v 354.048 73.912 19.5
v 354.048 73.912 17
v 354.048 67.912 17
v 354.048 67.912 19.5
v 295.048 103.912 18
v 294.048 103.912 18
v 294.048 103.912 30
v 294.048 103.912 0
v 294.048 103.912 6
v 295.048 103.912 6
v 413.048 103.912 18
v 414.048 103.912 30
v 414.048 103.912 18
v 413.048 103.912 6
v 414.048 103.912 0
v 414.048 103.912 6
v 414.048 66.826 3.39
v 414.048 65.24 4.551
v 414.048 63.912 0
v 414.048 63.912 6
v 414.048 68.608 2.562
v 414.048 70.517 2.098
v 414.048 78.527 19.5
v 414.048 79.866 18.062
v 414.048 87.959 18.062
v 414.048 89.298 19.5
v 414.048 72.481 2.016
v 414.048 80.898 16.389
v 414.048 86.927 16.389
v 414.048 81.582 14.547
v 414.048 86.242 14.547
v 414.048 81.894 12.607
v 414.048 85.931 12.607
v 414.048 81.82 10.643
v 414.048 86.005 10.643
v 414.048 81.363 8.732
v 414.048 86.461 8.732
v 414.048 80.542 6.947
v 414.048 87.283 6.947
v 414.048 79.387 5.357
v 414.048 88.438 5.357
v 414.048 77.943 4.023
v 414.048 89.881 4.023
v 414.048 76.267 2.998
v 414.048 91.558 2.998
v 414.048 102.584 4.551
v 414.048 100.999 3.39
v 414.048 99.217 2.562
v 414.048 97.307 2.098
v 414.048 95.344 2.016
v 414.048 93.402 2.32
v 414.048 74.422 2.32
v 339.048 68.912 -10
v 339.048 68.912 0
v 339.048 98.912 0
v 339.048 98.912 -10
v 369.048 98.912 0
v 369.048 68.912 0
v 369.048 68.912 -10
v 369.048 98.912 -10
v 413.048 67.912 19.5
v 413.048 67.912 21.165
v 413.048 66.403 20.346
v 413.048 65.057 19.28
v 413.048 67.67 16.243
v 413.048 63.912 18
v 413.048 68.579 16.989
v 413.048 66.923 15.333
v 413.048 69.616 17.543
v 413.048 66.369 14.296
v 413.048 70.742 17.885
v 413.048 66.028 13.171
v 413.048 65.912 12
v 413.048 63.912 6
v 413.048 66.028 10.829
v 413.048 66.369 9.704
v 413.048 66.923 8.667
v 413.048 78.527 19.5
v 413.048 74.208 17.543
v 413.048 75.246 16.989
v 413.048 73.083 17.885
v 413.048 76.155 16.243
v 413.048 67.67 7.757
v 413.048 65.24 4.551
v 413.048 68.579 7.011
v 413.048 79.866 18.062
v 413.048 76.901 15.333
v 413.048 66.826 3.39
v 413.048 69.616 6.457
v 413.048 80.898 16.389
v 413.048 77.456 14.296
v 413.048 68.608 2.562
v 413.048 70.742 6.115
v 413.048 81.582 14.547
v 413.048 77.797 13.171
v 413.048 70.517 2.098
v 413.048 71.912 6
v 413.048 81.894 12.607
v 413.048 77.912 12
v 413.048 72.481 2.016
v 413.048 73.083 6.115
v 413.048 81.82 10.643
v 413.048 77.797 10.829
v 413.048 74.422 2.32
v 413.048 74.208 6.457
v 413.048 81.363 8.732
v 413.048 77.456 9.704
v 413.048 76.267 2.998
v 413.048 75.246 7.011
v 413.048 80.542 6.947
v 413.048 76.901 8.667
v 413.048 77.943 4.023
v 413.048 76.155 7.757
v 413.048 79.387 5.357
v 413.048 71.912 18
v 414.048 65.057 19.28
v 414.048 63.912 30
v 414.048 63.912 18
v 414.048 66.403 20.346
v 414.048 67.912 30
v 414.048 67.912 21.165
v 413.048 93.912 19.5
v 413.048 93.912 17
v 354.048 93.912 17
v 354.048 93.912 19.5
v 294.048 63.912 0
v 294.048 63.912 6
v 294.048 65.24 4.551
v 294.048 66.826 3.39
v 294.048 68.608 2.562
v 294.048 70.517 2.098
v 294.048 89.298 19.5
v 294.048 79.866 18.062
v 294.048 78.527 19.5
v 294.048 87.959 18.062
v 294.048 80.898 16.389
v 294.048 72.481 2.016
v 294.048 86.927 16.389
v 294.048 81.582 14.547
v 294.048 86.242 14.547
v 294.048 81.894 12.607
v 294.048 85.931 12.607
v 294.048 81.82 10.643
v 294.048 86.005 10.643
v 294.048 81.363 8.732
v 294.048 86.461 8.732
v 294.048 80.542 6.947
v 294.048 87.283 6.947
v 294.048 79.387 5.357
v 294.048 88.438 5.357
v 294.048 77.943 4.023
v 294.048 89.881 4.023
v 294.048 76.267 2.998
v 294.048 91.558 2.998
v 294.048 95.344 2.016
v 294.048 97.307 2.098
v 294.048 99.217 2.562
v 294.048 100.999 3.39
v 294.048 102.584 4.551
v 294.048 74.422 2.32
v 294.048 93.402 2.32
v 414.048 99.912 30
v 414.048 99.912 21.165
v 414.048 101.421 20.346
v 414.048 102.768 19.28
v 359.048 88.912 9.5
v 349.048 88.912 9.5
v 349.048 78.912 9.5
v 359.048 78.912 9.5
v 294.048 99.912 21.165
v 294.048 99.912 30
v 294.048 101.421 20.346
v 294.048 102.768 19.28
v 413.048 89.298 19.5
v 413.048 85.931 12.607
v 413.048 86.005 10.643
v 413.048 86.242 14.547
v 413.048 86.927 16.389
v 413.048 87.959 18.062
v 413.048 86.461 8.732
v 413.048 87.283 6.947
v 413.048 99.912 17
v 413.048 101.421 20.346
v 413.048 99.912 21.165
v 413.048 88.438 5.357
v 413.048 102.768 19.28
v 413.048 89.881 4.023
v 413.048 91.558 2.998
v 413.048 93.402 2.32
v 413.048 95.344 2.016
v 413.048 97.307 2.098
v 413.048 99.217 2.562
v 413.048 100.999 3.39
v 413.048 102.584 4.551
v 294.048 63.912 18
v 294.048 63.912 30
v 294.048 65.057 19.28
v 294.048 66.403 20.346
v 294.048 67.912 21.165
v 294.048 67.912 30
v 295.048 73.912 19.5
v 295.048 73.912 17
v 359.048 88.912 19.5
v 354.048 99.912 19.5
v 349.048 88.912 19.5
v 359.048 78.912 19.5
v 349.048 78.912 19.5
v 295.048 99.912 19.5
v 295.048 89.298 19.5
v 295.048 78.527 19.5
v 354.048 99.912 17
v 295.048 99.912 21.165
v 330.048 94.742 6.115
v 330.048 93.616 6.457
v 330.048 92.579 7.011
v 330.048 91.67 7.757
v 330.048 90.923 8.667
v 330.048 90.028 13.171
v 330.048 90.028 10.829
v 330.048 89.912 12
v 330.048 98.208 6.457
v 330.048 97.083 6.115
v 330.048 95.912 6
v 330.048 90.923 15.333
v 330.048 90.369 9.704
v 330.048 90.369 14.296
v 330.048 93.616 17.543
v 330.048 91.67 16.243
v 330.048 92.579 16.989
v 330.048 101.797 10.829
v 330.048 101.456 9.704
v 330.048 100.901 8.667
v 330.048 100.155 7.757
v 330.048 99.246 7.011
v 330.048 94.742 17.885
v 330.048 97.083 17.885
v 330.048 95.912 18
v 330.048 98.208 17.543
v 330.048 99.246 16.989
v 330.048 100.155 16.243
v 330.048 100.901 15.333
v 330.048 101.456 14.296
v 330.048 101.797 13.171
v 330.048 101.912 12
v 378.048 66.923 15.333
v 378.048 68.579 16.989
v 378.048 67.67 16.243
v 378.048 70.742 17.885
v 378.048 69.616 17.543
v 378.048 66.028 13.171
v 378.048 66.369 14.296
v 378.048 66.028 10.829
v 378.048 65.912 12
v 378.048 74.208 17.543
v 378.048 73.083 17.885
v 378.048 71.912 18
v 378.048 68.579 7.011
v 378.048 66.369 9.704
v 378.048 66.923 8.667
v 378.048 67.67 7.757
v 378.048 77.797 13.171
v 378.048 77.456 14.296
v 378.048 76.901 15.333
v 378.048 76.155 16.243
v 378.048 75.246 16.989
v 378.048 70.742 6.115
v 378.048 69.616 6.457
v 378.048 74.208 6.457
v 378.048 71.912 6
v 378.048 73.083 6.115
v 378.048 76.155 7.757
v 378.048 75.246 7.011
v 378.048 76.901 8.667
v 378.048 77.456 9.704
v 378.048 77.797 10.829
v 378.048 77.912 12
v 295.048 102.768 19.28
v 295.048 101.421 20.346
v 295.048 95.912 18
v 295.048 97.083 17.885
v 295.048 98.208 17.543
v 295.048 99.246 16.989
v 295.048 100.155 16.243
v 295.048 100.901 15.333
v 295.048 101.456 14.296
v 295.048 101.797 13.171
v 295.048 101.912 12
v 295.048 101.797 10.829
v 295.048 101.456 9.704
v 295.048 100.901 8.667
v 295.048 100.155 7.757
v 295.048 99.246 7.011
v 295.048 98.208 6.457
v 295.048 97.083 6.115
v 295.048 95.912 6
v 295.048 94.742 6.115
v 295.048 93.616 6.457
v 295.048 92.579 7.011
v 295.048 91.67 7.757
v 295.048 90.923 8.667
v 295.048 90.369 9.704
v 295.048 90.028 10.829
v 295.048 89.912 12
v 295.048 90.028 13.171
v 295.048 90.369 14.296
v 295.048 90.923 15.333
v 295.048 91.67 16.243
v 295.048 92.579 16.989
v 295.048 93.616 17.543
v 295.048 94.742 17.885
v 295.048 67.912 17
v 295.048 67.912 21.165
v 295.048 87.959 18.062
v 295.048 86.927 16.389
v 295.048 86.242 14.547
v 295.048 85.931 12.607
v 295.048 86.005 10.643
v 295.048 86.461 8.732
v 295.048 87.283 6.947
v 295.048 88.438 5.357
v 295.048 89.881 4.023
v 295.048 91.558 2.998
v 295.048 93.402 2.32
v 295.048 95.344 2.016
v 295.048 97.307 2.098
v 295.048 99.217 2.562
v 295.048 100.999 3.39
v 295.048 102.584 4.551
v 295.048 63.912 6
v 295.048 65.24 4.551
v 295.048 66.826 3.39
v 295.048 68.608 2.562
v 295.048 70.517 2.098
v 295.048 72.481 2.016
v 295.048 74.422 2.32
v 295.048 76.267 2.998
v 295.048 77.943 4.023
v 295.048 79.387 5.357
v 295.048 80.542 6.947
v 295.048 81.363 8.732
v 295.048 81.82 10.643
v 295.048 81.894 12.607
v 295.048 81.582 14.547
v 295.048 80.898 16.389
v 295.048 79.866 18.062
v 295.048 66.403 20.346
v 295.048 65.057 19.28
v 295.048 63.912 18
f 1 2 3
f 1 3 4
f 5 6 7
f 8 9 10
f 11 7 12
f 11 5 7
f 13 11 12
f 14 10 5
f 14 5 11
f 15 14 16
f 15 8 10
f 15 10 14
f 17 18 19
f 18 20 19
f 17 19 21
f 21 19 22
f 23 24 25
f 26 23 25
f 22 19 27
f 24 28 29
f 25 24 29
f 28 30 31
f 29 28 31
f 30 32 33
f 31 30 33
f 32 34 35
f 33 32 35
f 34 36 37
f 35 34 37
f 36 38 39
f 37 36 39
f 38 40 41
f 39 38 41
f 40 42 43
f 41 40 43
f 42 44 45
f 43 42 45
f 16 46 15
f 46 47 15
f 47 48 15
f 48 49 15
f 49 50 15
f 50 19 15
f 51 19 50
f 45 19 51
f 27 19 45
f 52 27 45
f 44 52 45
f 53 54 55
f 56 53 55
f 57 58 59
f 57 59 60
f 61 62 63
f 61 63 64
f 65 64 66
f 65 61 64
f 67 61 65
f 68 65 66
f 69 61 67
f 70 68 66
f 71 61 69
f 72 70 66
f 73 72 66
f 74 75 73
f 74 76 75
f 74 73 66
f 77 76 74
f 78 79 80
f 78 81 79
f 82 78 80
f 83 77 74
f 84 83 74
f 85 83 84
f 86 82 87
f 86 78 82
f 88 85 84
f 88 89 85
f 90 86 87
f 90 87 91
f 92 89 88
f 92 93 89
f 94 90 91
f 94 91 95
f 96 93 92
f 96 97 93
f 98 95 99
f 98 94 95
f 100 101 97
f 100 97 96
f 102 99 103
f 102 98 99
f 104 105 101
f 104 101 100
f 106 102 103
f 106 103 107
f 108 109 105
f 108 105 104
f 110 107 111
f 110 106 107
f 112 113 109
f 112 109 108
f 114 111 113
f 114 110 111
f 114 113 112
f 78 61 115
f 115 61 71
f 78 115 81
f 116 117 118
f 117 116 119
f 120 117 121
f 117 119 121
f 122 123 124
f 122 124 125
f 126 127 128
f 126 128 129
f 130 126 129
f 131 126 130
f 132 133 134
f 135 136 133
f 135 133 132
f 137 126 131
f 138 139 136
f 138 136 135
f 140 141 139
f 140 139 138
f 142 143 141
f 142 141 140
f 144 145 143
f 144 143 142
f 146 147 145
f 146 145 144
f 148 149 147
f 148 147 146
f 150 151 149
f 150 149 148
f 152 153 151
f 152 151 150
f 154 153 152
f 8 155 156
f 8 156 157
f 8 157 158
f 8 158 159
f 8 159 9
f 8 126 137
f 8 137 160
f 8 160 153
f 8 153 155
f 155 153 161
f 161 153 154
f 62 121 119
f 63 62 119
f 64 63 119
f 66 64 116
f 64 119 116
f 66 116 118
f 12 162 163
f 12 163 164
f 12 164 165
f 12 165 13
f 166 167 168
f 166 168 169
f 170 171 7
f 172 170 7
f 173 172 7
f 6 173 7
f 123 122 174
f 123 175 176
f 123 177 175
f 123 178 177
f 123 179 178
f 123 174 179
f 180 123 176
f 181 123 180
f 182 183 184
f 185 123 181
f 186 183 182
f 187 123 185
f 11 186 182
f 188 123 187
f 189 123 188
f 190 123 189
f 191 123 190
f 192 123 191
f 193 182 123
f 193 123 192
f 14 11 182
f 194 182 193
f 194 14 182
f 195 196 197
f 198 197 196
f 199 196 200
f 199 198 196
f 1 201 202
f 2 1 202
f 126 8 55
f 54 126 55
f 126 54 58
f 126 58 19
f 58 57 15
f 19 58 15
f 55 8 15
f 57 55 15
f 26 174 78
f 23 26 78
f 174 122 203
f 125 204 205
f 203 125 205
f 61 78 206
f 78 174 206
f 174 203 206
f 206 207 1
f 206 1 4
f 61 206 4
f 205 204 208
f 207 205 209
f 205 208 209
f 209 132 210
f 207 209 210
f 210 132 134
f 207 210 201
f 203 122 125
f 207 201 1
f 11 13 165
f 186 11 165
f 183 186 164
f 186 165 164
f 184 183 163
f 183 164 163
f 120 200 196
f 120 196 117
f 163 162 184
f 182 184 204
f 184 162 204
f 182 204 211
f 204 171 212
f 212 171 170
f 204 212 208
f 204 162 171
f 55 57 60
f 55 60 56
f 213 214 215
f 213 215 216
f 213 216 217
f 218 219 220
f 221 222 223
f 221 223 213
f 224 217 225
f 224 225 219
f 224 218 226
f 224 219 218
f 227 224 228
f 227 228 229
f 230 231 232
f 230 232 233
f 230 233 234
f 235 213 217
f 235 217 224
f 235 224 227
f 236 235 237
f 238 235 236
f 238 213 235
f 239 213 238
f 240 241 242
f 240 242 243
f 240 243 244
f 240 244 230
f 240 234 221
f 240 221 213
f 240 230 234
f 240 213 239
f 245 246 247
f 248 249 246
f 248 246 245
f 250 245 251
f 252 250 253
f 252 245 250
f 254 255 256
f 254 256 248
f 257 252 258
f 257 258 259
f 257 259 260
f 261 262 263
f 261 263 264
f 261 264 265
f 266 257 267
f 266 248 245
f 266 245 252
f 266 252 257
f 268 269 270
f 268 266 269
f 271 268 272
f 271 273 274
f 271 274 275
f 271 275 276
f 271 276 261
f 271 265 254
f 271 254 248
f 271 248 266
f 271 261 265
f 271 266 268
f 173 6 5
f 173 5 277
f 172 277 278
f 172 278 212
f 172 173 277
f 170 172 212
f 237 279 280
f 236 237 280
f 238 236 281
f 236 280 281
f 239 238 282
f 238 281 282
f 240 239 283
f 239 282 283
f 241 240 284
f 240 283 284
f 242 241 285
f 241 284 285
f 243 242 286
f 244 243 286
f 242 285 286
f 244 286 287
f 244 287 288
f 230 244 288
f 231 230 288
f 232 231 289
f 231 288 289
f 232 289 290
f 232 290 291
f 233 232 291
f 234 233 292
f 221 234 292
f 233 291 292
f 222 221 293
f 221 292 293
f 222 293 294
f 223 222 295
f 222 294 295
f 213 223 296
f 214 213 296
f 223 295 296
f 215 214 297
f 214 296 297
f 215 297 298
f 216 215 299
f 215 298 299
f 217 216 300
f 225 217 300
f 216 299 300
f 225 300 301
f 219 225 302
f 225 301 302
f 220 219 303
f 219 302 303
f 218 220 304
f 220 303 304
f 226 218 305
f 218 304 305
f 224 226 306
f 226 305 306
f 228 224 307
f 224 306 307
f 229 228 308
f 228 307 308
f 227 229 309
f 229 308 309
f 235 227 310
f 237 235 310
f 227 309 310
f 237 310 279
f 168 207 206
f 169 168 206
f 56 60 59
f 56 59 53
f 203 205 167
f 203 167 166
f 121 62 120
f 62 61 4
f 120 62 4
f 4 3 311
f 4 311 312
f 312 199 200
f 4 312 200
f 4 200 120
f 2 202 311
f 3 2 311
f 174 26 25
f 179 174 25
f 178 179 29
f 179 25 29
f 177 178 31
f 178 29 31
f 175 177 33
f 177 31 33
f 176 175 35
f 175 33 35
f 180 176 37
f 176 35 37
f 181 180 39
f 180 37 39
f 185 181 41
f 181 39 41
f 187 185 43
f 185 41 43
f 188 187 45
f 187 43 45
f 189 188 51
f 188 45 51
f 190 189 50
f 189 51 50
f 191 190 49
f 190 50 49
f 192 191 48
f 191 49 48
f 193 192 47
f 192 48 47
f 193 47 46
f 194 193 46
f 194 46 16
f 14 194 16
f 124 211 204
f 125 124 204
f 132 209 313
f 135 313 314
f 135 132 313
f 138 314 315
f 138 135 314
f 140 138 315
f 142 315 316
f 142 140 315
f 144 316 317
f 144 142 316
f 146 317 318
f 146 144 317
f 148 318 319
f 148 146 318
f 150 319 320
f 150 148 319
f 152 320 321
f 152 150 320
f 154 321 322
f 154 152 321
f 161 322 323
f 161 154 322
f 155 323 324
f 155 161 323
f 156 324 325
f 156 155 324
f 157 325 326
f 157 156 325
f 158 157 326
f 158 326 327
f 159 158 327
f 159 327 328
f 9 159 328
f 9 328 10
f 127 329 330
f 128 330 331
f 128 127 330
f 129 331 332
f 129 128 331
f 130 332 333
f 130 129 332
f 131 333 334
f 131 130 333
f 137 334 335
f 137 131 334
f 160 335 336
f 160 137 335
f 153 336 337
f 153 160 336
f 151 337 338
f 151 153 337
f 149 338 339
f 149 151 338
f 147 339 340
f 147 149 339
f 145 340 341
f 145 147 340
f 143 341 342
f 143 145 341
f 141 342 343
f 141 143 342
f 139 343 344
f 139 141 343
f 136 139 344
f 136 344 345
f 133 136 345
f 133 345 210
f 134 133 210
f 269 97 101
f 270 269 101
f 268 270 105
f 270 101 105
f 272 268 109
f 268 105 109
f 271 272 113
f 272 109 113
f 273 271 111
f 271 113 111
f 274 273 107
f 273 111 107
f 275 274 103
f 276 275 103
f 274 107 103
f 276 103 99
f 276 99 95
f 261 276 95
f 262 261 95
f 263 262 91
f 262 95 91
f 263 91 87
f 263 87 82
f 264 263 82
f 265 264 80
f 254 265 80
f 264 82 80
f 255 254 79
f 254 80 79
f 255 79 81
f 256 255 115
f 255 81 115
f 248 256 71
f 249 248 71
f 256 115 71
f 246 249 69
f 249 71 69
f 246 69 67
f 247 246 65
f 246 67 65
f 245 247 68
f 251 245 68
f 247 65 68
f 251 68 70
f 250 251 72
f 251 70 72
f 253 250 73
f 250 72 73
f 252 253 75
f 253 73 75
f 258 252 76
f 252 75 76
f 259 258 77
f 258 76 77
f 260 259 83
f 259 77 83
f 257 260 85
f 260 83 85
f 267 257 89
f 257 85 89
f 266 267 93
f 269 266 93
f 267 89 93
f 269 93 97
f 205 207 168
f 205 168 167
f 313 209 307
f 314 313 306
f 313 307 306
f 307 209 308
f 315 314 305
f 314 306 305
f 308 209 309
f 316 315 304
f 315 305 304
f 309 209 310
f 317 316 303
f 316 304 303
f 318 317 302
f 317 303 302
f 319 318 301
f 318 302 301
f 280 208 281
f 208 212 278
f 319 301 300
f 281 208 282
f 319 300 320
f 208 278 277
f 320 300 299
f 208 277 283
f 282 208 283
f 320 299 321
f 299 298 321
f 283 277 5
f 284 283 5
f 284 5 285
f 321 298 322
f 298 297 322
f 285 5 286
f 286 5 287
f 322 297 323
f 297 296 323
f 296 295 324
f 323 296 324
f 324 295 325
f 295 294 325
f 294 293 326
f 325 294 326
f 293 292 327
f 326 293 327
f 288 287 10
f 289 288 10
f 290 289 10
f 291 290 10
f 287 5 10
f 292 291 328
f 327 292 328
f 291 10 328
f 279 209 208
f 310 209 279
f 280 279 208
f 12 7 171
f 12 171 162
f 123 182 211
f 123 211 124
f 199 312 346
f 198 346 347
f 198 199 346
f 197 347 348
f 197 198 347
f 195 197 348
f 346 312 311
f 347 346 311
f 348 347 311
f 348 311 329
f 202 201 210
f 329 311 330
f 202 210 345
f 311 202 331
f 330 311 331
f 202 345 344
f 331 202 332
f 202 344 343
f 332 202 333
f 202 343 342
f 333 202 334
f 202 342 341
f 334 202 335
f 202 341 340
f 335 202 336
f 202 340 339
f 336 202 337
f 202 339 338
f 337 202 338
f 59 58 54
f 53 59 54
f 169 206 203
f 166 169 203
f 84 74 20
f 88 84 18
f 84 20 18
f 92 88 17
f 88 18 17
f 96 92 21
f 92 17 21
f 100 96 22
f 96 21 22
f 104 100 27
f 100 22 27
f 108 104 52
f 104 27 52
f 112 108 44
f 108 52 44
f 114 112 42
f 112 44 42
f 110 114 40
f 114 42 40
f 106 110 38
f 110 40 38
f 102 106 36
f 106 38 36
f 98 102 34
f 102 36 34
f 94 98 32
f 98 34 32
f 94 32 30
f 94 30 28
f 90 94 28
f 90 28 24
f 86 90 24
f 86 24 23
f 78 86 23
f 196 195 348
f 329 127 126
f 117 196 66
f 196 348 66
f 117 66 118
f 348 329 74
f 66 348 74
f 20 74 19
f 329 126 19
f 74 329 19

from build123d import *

# Parameters (mm, degrees)
SKETCH1_W           = 120
SKETCH1_H           = 40
BOSS_EXTRUDE1_DEPTH = 30
CUT_EXTRUDE1_DEPTH  = 60
CUT_EXTRUDE2_DEPTH  = 60
SKETCH6_W           = 30
SKETCH6_H           = 30
BOSS_EXTRUDE2_DEPTH = 10
SKETCH7_R           = 10
CUT_EXTRUDE3_DEPTH  = 1
SKETCH9_R           = 6
CUT_EXTRUDE4_DEPTH  = 35
SKETCH10_R          = 6
CUT_EXTRUDE5_DEPTH  = 35
SKETCH11_W          = 10
SKETCH11_H          = 10
CUT_EXTRUDE6_DEPTH  = 10


with BuildPart() as part:
    # Sketch1 → Boss-Extrude1 (new body)
    with BuildSketch(Plane.XY):
        with Locations((354.047582571, 83.912277662)):
            Rectangle(SKETCH1_W, SKETCH1_H)
    extrude(amount=BOSS_EXTRUDE1_DEPTH)

    # Sketch2 → Cut-Extrude1 (cut)
    with BuildSketch(Plane(origin=(414.047582571, 0, 0), x_dir=(0, 0, -1), z_dir=(1, 0, 0))):
        Polygon((-30, 99.912277662), (-19.5, 99.912277662), (-17, 99.912277662), (-17, 93.912277662), (-19.5, 93.912277662), (-19.5, 67.912277662), (-30, 67.912277662), align=None)
    extrude(amount=-CUT_EXTRUDE1_DEPTH, mode=Mode.SUBTRACT)

    # Sketch5 → Cut-Extrude2 (cut)
    with BuildSketch(Plane.ZY.offset(-294.047582571)):
        Polygon((30, 99.912277662), (19.5, 99.912277662), (19.5, 73.912277662), (17, 73.912277662), (17, 67.912277662), (19.5, 67.912277662), (30, 67.912277662), align=None)
    extrude(amount=-CUT_EXTRUDE2_DEPTH, mode=Mode.SUBTRACT)

    # Sketch6 → Boss-Extrude2 (add)
    with BuildSketch(Plane(origin=(0, 0, 0), x_dir=(-1, 0, 0), z_dir=(0, 0, -1))):
        with Locations((-354.047582571, 83.912277662)):
            Rectangle(SKETCH6_W, SKETCH6_H)
    extrude(amount=BOSS_EXTRUDE2_DEPTH)

    # Sketch7 → Cut-Extrude3 (cut)
    with BuildSketch(Plane(origin=(414.047582571, 0, 0), x_dir=(0, 0, -1), z_dir=(1, 0, 0))):
        with Locations((-12, 95.912277662)):
            Circle(SKETCH7_R)
        with Locations((-12, 71.912277662)):
            Circle(SKETCH7_R)
    cut_extrude3 = extrude(amount=-CUT_EXTRUDE3_DEPTH, mode=Mode.SUBTRACT)

    # Mirror1: Cut-Extrude3 across plane
    add(cut_extrude3.mirror(Plane.ZY.offset(-354.047582571)), mode=Mode.SUBTRACT)

    # Sketch9 → Cut-Extrude4 (cut)
    with BuildSketch(Plane(origin=(413.047582571, 0, 0), x_dir=(0, 0, -1), z_dir=(1, 0, 0))):
        with Locations((-12, 71.912277662)):
            Circle(SKETCH9_R)
    extrude(amount=-CUT_EXTRUDE4_DEPTH, mode=Mode.SUBTRACT)

    # Sketch10 → Cut-Extrude5 (cut)
    with BuildSketch(Plane.ZY.offset(-295.047582571)):
        with Locations((12, 95.912277662)):
            Circle(SKETCH10_R)
    extrude(amount=-CUT_EXTRUDE5_DEPTH, mode=Mode.SUBTRACT)

    # Sketch11 → Cut-Extrude6 (cut)
    with BuildSketch(Plane.XY.offset(19.5)):
        with Locations((354.047582571, 83.912277662)):
            Rectangle(SKETCH11_W, SKETCH11_H)
    extrude(amount=-CUT_EXTRUDE6_DEPTH, mode=Mode.SUBTRACT)


solid = part.part
